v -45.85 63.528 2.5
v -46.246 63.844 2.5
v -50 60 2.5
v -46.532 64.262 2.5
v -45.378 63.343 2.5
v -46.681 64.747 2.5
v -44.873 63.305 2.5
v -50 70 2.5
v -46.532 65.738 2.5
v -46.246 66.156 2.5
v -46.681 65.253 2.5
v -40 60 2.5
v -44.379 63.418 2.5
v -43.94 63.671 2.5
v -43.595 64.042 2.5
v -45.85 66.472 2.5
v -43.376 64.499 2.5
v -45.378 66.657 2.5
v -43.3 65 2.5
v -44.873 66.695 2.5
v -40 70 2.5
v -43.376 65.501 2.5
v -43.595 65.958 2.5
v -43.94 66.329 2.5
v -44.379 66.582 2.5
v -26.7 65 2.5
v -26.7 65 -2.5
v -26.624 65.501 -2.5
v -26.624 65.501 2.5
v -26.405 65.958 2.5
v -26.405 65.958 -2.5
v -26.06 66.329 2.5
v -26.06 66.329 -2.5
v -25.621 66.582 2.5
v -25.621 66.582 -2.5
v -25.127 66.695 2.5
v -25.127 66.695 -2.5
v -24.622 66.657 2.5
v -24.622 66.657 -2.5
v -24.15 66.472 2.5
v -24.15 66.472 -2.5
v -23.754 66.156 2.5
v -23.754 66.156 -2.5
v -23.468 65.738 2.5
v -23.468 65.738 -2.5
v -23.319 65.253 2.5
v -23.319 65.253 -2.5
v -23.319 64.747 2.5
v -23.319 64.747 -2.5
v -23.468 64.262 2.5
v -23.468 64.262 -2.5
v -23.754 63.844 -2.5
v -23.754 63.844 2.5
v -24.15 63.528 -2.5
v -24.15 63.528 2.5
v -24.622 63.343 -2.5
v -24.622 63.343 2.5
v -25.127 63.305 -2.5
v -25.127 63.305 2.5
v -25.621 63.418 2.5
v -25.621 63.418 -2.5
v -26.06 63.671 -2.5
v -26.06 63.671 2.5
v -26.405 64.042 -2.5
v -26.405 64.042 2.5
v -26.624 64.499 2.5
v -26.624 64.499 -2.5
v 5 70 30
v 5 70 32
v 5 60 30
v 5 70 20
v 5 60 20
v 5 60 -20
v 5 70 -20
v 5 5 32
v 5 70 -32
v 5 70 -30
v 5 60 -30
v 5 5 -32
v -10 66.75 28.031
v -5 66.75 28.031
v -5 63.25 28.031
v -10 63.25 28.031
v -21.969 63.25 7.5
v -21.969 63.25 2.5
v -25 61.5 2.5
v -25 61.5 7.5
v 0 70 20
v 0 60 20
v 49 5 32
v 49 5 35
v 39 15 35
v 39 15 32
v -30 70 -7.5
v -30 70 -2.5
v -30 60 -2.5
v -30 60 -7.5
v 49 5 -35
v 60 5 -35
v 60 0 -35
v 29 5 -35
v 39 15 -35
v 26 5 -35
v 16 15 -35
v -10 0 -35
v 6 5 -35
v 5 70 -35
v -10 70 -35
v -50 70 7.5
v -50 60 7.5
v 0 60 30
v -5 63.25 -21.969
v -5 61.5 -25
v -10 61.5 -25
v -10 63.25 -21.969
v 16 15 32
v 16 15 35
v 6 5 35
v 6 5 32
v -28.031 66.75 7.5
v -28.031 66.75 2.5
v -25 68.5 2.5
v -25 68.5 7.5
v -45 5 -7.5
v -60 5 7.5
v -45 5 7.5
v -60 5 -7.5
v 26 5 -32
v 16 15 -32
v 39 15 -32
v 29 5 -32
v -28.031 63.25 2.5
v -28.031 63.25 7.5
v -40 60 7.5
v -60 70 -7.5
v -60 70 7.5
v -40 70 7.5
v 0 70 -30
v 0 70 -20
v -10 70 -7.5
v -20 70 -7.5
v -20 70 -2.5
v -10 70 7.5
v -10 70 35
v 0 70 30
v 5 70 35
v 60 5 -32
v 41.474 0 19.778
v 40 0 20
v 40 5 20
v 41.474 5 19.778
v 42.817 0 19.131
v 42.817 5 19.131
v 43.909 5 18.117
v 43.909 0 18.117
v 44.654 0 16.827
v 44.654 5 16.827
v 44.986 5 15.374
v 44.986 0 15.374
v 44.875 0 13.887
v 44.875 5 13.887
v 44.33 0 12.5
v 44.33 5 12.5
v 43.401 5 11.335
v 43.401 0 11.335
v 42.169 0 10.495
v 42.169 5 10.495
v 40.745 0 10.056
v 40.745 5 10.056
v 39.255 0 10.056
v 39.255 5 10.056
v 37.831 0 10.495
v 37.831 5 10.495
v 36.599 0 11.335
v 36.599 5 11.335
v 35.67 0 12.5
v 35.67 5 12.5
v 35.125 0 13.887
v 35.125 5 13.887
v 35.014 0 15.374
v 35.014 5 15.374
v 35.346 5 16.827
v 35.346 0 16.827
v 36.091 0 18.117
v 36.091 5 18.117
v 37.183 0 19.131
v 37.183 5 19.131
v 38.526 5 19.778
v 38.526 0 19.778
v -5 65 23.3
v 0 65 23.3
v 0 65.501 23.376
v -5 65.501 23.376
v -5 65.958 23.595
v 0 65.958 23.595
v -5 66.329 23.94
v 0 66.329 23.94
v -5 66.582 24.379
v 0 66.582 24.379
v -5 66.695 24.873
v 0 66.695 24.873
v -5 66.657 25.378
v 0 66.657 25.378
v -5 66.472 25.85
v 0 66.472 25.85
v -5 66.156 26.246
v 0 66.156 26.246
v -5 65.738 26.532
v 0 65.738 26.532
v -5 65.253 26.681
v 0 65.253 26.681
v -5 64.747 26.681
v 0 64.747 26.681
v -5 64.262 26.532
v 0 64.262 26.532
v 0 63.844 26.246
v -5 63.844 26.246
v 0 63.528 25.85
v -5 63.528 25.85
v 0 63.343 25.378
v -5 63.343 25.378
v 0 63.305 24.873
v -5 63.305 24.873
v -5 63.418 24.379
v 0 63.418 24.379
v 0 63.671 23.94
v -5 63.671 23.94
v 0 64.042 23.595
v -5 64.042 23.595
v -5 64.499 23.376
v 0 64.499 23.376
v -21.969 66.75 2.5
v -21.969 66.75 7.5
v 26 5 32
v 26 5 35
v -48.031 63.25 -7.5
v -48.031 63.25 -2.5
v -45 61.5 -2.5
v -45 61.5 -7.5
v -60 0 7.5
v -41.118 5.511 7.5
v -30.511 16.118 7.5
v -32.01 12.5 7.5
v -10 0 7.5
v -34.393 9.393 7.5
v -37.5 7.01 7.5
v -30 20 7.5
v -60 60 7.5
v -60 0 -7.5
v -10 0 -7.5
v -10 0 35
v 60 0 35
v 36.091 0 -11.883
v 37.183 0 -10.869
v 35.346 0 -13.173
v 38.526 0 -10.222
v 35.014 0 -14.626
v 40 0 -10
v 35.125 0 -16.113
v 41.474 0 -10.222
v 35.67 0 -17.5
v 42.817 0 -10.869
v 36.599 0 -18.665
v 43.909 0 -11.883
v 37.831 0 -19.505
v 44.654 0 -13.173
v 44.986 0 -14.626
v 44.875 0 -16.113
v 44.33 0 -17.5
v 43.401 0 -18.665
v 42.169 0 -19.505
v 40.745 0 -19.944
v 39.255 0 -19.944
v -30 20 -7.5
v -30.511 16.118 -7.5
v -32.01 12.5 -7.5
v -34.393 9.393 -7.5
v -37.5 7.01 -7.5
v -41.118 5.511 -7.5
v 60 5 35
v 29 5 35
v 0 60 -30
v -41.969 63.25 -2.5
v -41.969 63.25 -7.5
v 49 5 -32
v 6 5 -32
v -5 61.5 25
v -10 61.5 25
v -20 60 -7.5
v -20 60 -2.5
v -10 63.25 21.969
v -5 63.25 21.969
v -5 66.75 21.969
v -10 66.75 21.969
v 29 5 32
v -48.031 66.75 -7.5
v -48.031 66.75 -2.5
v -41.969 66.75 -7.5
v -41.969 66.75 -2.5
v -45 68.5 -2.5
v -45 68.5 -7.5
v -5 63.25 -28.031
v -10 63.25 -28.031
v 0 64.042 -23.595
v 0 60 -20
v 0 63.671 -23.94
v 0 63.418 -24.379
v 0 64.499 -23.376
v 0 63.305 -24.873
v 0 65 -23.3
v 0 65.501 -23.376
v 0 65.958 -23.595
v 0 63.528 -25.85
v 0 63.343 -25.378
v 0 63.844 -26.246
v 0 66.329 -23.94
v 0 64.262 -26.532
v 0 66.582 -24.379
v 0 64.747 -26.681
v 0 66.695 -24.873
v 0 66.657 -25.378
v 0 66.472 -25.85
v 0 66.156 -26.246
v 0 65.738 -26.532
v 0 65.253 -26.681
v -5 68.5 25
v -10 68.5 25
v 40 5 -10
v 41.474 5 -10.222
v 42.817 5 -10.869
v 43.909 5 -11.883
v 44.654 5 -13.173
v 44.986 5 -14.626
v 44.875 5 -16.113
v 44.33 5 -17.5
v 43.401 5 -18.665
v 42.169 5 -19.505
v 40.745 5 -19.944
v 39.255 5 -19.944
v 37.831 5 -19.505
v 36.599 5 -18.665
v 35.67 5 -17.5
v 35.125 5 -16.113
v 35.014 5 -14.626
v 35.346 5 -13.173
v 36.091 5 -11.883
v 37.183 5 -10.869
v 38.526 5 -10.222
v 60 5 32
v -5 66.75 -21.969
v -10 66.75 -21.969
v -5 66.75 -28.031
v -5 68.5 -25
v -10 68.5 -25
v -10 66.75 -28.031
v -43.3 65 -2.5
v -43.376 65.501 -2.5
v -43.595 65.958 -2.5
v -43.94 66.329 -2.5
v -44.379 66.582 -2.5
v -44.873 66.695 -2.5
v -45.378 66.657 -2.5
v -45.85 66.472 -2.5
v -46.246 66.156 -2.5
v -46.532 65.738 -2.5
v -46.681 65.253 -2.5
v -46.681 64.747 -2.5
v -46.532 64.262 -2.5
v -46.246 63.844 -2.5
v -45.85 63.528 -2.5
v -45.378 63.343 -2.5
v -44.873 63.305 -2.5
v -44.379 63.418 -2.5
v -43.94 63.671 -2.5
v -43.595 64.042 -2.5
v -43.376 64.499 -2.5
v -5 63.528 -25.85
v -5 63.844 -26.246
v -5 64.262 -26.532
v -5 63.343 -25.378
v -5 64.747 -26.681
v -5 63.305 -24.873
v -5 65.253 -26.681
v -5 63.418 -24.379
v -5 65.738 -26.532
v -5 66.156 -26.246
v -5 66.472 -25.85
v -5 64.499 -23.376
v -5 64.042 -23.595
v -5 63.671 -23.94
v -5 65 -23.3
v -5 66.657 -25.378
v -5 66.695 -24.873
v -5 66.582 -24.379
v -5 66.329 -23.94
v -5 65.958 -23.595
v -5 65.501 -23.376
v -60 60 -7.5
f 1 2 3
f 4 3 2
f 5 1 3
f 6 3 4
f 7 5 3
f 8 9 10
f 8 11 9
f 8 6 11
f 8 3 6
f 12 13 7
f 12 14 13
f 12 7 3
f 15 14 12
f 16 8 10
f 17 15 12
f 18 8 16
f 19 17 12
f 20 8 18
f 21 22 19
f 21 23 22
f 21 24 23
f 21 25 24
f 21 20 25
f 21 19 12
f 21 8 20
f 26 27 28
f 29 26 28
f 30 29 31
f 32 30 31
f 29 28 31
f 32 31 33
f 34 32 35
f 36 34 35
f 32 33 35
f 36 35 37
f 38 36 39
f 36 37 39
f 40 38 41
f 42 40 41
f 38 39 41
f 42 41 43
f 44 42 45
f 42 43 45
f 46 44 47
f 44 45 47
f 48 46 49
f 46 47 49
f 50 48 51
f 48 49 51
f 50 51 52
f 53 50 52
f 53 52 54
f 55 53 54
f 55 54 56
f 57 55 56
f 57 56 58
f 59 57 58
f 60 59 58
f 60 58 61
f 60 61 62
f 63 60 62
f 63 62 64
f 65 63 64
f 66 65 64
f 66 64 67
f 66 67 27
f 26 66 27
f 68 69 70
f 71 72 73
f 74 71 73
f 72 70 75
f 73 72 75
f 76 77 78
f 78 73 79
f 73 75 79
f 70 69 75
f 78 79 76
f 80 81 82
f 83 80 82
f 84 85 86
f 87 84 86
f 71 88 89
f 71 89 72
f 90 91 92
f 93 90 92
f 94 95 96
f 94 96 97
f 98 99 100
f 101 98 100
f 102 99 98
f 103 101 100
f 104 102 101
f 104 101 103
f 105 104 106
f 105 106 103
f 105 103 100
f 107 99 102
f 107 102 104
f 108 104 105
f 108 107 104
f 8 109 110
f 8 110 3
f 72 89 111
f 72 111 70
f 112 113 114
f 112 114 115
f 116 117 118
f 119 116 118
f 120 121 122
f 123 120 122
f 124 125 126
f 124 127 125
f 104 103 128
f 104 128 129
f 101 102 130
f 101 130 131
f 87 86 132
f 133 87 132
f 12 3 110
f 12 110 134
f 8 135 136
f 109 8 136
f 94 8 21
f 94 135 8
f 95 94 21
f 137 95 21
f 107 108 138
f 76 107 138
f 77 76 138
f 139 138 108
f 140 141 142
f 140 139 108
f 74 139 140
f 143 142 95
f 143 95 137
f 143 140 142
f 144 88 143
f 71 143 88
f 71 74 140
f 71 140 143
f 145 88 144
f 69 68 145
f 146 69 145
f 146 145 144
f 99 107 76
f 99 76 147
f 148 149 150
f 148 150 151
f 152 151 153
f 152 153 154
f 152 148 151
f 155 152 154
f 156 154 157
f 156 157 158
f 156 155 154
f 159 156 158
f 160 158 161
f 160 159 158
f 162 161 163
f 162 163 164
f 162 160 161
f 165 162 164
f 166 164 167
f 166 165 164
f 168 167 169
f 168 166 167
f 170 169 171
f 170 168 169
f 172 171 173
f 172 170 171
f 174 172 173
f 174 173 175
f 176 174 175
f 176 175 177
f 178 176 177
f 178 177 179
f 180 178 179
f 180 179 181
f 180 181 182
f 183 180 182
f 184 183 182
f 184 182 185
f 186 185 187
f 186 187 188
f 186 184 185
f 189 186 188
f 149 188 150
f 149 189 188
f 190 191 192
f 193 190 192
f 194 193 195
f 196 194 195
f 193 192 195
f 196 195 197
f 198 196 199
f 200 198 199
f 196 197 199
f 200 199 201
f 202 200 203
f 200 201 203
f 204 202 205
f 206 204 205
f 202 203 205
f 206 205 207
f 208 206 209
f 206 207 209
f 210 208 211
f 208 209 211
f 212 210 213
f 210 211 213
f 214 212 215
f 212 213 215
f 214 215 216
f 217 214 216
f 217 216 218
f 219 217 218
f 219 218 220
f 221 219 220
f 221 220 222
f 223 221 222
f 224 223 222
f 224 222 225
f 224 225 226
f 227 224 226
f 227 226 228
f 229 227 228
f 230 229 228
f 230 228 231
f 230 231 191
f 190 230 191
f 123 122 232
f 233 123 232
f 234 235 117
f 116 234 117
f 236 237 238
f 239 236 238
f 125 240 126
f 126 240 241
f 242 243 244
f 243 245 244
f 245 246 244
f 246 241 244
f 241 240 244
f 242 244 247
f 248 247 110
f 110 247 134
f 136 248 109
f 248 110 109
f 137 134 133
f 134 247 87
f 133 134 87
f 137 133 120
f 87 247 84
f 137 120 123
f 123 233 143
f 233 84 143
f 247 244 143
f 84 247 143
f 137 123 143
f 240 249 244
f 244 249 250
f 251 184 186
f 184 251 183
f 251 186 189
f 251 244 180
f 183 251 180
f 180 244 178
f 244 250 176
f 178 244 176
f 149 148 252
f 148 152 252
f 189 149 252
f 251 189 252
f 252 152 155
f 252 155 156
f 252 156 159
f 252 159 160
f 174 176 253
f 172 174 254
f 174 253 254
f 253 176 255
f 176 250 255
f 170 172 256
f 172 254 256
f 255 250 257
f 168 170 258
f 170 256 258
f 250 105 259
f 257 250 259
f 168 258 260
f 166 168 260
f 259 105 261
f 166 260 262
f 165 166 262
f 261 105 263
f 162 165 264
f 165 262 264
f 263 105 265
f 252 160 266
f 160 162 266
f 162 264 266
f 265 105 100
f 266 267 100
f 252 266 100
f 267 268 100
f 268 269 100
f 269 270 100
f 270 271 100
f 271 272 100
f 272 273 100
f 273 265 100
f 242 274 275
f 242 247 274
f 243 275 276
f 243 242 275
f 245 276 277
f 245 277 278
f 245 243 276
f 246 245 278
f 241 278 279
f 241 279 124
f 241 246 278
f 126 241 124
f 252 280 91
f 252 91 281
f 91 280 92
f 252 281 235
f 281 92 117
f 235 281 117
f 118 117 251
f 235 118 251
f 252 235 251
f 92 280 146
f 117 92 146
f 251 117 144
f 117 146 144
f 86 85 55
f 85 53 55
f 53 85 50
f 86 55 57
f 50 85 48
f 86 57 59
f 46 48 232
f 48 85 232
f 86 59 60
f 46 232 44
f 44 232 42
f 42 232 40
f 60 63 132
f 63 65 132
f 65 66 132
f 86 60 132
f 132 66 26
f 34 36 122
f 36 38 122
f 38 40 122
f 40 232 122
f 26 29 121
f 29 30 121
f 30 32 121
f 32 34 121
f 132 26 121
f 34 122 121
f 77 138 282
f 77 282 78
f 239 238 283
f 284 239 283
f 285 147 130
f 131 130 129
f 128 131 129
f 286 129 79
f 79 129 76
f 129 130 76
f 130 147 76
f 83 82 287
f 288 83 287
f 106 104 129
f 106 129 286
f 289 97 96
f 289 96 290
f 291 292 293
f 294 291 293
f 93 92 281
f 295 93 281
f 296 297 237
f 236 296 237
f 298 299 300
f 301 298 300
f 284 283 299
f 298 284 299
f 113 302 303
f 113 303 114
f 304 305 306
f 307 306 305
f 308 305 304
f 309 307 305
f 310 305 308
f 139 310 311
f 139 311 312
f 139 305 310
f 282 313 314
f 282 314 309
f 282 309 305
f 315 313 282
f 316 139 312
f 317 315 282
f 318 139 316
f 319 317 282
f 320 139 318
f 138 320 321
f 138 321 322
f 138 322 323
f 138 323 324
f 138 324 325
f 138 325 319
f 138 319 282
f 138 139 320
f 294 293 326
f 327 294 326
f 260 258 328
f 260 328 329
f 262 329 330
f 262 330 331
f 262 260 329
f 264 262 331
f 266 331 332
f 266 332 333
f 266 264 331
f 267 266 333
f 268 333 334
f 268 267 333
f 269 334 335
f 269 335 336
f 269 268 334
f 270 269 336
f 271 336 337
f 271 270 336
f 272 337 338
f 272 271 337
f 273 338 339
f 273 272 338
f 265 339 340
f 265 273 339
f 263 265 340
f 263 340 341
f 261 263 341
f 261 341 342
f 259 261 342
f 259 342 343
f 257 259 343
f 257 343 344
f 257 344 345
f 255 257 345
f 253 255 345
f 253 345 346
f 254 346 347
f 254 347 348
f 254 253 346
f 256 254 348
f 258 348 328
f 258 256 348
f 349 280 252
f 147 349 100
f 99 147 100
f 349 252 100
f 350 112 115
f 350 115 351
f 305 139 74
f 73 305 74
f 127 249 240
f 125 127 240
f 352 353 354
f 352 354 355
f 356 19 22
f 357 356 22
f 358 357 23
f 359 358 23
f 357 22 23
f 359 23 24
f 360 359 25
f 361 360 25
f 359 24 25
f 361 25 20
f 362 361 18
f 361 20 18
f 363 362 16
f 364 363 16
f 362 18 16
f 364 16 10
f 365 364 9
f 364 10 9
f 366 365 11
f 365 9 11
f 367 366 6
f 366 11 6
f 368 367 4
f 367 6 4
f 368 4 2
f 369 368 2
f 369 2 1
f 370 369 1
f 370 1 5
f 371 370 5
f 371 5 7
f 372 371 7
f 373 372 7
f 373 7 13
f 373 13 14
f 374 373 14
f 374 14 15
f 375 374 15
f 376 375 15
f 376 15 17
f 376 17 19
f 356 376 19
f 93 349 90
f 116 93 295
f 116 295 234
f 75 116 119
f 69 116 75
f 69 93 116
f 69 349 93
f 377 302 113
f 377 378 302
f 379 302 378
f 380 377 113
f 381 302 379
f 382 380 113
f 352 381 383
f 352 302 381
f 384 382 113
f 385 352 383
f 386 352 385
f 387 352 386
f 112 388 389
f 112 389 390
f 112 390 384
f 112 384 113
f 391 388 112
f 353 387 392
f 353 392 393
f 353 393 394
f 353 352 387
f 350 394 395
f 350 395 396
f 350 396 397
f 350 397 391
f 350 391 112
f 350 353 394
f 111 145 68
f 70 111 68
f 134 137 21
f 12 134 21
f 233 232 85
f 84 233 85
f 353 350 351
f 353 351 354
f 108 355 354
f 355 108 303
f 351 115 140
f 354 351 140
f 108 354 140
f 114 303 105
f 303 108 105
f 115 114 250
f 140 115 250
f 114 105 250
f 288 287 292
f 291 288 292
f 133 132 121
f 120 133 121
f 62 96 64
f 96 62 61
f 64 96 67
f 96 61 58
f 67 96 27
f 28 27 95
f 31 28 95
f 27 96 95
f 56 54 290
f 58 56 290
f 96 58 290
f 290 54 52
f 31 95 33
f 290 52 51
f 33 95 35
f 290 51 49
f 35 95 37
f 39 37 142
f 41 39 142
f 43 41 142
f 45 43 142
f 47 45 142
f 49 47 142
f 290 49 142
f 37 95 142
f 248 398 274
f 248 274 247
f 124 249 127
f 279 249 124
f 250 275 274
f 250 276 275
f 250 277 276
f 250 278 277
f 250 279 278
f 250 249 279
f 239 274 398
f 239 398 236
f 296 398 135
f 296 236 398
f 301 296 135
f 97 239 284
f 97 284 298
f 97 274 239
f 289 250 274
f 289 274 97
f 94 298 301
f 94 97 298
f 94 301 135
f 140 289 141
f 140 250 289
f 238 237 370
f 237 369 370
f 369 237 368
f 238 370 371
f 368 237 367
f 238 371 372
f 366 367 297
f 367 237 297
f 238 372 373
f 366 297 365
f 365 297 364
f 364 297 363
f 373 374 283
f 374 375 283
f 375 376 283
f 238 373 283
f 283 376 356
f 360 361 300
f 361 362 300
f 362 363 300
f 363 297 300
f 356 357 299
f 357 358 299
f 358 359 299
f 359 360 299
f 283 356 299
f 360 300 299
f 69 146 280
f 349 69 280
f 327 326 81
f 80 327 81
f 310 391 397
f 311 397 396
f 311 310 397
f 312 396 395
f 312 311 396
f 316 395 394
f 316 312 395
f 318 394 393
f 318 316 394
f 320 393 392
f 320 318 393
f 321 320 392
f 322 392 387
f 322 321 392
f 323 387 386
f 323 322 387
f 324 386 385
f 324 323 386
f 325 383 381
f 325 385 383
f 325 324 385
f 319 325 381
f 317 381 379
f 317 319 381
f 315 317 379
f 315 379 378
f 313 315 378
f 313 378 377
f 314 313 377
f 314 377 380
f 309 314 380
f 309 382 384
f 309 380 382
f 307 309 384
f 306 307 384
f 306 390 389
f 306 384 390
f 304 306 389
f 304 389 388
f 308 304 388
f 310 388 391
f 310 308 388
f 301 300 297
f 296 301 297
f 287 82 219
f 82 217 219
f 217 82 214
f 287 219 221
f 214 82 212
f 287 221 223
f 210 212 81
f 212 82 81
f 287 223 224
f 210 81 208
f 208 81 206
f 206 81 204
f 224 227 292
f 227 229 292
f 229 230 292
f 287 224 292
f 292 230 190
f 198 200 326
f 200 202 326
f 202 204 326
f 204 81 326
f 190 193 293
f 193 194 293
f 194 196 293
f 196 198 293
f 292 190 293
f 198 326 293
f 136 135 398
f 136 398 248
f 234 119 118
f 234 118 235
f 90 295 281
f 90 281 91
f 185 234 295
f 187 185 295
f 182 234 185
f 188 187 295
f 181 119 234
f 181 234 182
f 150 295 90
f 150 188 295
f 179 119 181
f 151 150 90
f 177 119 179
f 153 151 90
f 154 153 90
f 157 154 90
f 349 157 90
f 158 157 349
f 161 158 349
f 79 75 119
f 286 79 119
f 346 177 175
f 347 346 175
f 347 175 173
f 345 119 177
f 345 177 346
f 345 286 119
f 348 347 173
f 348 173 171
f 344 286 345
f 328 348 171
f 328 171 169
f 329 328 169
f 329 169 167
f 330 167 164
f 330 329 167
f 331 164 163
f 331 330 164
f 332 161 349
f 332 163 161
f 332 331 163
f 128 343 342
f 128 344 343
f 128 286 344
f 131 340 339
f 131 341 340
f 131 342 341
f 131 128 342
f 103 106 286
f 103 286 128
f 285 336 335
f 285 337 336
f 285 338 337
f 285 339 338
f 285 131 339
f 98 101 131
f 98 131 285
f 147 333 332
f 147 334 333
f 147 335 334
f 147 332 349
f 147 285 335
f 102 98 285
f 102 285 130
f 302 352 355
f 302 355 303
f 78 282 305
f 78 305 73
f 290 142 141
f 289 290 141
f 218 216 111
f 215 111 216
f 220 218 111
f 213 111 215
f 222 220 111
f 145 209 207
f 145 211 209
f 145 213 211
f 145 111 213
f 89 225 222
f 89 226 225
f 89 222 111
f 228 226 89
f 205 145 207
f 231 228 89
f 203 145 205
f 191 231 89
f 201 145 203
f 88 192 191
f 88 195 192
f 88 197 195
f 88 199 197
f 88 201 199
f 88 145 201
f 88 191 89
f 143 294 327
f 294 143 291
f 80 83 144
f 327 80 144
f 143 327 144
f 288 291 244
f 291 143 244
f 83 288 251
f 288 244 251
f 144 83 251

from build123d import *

# Parameters (mm, degrees)
SKETCH1_R           = 5
BOSS_EXTRUDE1_DEPTH = 5
BOSS_EXTRUDE2_DEPTH = 65
SKETCH3_W           = 15
SKETCH3_H           = 10
BOSS_EXTRUDE3_DEPTH = 30
CHAMFER2_SIZE2      = 40
CHAMFER2_SIZE       = 30
SKETCH4_W           = 10
SKETCH4_H           = 5
SKETCH4_W_2         = 5
SKETCH4_H_2         = 10
CUT_EXTRUDE1_DEPTH  = 10
CUT_EXTRUDE2_START  = -5
CUT_EXTRUDE2_DEPTH  = 10
SKETCH6_R           = 1.7
CUT_EXTRUDE3_DEPTH  = 10
SKETCH7_R           = 1.7
CUT_EXTRUDE4_DEPTH  = 10
CUT_EXTRUDE5_START  = -5
CUT_EXTRUDE5_DEPTH  = 10
SKETCH9_R           = 1.7
CUT_EXTRUDE6_DEPTH  = 10
CUT_EXTRUDE7_START  = -5
CUT_EXTRUDE7_DEPTH  = 10
FILLET2_R           = 15
BOSS_EXTRUDE4_DEPTH = 3


with BuildPart() as part:
    # Sketch1 → Boss-Extrude1 (new body)
    with BuildSketch(Plane(origin=(0, 0, 0), x_dir=(1, 0, 0), z_dir=(0, 1, 0))):
        Polygon((60, -35), (60, 35), (-10, 35), (-10, 7.5), (-60, 7.5), (-60, -7.5), (-10, -7.5), (-10, -35), align=None)
        with Locations(Location((40, 15, 0), (0, 0, 270))):
            Circle(SKETCH1_R, mode=Mode.SUBTRACT)
        with Locations(Location((40, -15, 0), (0, 0, 270))):
            Circle(SKETCH1_R, mode=Mode.SUBTRACT)
    extrude(amount=BOSS_EXTRUDE1_DEPTH)

    # Sketch2 → Boss-Extrude2 (add)
    with BuildSketch(Plane(origin=(0, 5, 0), x_dir=(1, 0, 0), z_dir=(0, 1, 0))):
        Polygon((-10, 35), (-10, 7.5), (-30, 7.5), (-30, -7.5), (-10, -7.5), (-10, -35), (5, -35), (5, 35), align=None)
    extrude(amount=BOSS_EXTRUDE2_DEPTH)

    # Sketch3 → Boss-Extrude3 (add)
    with BuildSketch(Plane.ZY.offset(30)):
        with Locations((0, 65)):
            Rectangle(SKETCH3_W, SKETCH3_H)
    extrude(amount=BOSS_EXTRUDE3_DEPTH)

    # Chamfer2
    chamfer2_edges = [part.edges().sort_by_distance(p)[0] for p in [
        (-30, 60, 0),
    ]]
    chamfer2_side = [part.faces().sort_by_distance(p)[0] for p in [
        (-30.6, 60, 0),
    ]]
    chamfer(chamfer2_edges, length=CHAMFER2_SIZE - 0.0001, length2=CHAMFER2_SIZE2 - 0.0001, reference=chamfer2_side[0])  # a hair under: the kernel refuses the full size

    # Sketch4 → Cut-Extrude1 (cut)
    with BuildSketch(Plane(origin=(0, 70, 0), x_dir=(1, 0, 0), z_dir=(0, 1, 0))):
        with Locations((-25, 5)):
            Rectangle(SKETCH4_W, SKETCH4_H)
        with Locations((-45, -5)):
            Rectangle(SKETCH4_W, SKETCH4_H)
        with Locations((2.5, 25)):
            Rectangle(SKETCH4_W_2, SKETCH4_H_2)
        with Locations((2.5, -25)):
            Rectangle(SKETCH4_W_2, SKETCH4_H_2)
    extrude(amount=-CUT_EXTRUDE1_DEPTH, mode=Mode.SUBTRACT)

    # Sketch5 → Cut-Extrude2 (cut)
    with BuildSketch(Plane(origin=(0, 0, 0), x_dir=(0, 0, -1), z_dir=(1, 0, 0)).offset(CUT_EXTRUDE2_START)):
        Polygon((-25, 61.5), (-21.968911087, 63.25), (-21.968911087, 66.75), (-25, 68.5), (-28.031088913, 66.75), (-28.031088913, 63.25), align=None)
    cut_extrude2 = extrude(amount=-CUT_EXTRUDE2_DEPTH, mode=Mode.SUBTRACT)

    # Sketch6 → Cut-Extrude3 (cut)
    with BuildSketch(Plane(origin=(0, 0, 0), x_dir=(0, 0, -1), z_dir=(1, 0, 0))):
        with Locations((-25, 65)):
            Circle(SKETCH6_R)
    cut_extrude3 = extrude(amount=-CUT_EXTRUDE3_DEPTH, mode=Mode.SUBTRACT)

    # Mirror1: Cut-Extrude2 across plane
    add(cut_extrude2.mirror(Plane.XY), mode=Mode.SUBTRACT)

    # Mirror2: Cut-Extrude3 across plane
    add(cut_extrude3.mirror(Plane.XY), mode=Mode.SUBTRACT)

    # Sketch7 → Cut-Extrude4 (cut)
    with BuildSketch(Plane.XY.offset(2.5)):
        with Locations((-45, 65)):
            Circle(SKETCH7_R)
    extrude(amount=-CUT_EXTRUDE4_DEPTH, mode=Mode.SUBTRACT)

    # Sketch8 → Cut-Extrude5 (cut)
    with BuildSketch(Plane.XY.offset(2.5).offset(CUT_EXTRUDE5_START)):
        Polygon((-45, 68.5), (-48.031088913, 66.75), (-48.031088913, 63.25), (-45, 61.5), (-41.968911087, 63.25), (-41.968911087, 66.75), align=None)
    extrude(amount=-CUT_EXTRUDE5_DEPTH, mode=Mode.SUBTRACT)

    # Sketch9 → Cut-Extrude6 (cut)
    with BuildSketch(Plane(origin=(0, 0, -2.5), x_dir=(-1, 0, 0), z_dir=(0, 0, -1))):
        with Locations((25, 65)):
            Circle(SKETCH9_R)
    extrude(amount=-CUT_EXTRUDE6_DEPTH, mode=Mode.SUBTRACT)

    # Sketch10 → Cut-Extrude7 (cut)
    with BuildSketch(Plane(origin=(0, 0, -2.5), x_dir=(-1, 0, 0), z_dir=(0, 0, -1)).offset(CUT_EXTRUDE7_START)):
        Polygon((25, 68.5), (21.968911087, 66.75), (21.968911087, 63.25), (25, 61.5), (28.031088913, 63.25), (28.031088913, 66.75), align=None)
    extrude(amount=-CUT_EXTRUDE7_DEPTH, mode=Mode.SUBTRACT)

    # Fillet2
    fillet2_edges = [part.edges().sort_by_distance(p)[0] for p in [
        (-30, 5, 0),
    ]]
    fillet(fillet2_edges, radius=FILLET2_R)

    # Sketch11 → Boss-Extrude4 (add)
    with BuildSketch(Plane(origin=(0, 0, -35), x_dir=(-1, 0, 0), z_dir=(0, 0, -1))):
        Polygon((-5, 70), (-60, 5), (-49, 5), (-39, 15), (-29, 5), (-26, 5), (-16, 15), (-6, 5), (-5, 5), align=None)
    boss_extrude4 = extrude(amount=-BOSS_EXTRUDE4_DEPTH)

    # Mirror3: Boss-Extrude4 across plane
    add(boss_extrude4.mirror(Plane.XY))


solid = part.part
